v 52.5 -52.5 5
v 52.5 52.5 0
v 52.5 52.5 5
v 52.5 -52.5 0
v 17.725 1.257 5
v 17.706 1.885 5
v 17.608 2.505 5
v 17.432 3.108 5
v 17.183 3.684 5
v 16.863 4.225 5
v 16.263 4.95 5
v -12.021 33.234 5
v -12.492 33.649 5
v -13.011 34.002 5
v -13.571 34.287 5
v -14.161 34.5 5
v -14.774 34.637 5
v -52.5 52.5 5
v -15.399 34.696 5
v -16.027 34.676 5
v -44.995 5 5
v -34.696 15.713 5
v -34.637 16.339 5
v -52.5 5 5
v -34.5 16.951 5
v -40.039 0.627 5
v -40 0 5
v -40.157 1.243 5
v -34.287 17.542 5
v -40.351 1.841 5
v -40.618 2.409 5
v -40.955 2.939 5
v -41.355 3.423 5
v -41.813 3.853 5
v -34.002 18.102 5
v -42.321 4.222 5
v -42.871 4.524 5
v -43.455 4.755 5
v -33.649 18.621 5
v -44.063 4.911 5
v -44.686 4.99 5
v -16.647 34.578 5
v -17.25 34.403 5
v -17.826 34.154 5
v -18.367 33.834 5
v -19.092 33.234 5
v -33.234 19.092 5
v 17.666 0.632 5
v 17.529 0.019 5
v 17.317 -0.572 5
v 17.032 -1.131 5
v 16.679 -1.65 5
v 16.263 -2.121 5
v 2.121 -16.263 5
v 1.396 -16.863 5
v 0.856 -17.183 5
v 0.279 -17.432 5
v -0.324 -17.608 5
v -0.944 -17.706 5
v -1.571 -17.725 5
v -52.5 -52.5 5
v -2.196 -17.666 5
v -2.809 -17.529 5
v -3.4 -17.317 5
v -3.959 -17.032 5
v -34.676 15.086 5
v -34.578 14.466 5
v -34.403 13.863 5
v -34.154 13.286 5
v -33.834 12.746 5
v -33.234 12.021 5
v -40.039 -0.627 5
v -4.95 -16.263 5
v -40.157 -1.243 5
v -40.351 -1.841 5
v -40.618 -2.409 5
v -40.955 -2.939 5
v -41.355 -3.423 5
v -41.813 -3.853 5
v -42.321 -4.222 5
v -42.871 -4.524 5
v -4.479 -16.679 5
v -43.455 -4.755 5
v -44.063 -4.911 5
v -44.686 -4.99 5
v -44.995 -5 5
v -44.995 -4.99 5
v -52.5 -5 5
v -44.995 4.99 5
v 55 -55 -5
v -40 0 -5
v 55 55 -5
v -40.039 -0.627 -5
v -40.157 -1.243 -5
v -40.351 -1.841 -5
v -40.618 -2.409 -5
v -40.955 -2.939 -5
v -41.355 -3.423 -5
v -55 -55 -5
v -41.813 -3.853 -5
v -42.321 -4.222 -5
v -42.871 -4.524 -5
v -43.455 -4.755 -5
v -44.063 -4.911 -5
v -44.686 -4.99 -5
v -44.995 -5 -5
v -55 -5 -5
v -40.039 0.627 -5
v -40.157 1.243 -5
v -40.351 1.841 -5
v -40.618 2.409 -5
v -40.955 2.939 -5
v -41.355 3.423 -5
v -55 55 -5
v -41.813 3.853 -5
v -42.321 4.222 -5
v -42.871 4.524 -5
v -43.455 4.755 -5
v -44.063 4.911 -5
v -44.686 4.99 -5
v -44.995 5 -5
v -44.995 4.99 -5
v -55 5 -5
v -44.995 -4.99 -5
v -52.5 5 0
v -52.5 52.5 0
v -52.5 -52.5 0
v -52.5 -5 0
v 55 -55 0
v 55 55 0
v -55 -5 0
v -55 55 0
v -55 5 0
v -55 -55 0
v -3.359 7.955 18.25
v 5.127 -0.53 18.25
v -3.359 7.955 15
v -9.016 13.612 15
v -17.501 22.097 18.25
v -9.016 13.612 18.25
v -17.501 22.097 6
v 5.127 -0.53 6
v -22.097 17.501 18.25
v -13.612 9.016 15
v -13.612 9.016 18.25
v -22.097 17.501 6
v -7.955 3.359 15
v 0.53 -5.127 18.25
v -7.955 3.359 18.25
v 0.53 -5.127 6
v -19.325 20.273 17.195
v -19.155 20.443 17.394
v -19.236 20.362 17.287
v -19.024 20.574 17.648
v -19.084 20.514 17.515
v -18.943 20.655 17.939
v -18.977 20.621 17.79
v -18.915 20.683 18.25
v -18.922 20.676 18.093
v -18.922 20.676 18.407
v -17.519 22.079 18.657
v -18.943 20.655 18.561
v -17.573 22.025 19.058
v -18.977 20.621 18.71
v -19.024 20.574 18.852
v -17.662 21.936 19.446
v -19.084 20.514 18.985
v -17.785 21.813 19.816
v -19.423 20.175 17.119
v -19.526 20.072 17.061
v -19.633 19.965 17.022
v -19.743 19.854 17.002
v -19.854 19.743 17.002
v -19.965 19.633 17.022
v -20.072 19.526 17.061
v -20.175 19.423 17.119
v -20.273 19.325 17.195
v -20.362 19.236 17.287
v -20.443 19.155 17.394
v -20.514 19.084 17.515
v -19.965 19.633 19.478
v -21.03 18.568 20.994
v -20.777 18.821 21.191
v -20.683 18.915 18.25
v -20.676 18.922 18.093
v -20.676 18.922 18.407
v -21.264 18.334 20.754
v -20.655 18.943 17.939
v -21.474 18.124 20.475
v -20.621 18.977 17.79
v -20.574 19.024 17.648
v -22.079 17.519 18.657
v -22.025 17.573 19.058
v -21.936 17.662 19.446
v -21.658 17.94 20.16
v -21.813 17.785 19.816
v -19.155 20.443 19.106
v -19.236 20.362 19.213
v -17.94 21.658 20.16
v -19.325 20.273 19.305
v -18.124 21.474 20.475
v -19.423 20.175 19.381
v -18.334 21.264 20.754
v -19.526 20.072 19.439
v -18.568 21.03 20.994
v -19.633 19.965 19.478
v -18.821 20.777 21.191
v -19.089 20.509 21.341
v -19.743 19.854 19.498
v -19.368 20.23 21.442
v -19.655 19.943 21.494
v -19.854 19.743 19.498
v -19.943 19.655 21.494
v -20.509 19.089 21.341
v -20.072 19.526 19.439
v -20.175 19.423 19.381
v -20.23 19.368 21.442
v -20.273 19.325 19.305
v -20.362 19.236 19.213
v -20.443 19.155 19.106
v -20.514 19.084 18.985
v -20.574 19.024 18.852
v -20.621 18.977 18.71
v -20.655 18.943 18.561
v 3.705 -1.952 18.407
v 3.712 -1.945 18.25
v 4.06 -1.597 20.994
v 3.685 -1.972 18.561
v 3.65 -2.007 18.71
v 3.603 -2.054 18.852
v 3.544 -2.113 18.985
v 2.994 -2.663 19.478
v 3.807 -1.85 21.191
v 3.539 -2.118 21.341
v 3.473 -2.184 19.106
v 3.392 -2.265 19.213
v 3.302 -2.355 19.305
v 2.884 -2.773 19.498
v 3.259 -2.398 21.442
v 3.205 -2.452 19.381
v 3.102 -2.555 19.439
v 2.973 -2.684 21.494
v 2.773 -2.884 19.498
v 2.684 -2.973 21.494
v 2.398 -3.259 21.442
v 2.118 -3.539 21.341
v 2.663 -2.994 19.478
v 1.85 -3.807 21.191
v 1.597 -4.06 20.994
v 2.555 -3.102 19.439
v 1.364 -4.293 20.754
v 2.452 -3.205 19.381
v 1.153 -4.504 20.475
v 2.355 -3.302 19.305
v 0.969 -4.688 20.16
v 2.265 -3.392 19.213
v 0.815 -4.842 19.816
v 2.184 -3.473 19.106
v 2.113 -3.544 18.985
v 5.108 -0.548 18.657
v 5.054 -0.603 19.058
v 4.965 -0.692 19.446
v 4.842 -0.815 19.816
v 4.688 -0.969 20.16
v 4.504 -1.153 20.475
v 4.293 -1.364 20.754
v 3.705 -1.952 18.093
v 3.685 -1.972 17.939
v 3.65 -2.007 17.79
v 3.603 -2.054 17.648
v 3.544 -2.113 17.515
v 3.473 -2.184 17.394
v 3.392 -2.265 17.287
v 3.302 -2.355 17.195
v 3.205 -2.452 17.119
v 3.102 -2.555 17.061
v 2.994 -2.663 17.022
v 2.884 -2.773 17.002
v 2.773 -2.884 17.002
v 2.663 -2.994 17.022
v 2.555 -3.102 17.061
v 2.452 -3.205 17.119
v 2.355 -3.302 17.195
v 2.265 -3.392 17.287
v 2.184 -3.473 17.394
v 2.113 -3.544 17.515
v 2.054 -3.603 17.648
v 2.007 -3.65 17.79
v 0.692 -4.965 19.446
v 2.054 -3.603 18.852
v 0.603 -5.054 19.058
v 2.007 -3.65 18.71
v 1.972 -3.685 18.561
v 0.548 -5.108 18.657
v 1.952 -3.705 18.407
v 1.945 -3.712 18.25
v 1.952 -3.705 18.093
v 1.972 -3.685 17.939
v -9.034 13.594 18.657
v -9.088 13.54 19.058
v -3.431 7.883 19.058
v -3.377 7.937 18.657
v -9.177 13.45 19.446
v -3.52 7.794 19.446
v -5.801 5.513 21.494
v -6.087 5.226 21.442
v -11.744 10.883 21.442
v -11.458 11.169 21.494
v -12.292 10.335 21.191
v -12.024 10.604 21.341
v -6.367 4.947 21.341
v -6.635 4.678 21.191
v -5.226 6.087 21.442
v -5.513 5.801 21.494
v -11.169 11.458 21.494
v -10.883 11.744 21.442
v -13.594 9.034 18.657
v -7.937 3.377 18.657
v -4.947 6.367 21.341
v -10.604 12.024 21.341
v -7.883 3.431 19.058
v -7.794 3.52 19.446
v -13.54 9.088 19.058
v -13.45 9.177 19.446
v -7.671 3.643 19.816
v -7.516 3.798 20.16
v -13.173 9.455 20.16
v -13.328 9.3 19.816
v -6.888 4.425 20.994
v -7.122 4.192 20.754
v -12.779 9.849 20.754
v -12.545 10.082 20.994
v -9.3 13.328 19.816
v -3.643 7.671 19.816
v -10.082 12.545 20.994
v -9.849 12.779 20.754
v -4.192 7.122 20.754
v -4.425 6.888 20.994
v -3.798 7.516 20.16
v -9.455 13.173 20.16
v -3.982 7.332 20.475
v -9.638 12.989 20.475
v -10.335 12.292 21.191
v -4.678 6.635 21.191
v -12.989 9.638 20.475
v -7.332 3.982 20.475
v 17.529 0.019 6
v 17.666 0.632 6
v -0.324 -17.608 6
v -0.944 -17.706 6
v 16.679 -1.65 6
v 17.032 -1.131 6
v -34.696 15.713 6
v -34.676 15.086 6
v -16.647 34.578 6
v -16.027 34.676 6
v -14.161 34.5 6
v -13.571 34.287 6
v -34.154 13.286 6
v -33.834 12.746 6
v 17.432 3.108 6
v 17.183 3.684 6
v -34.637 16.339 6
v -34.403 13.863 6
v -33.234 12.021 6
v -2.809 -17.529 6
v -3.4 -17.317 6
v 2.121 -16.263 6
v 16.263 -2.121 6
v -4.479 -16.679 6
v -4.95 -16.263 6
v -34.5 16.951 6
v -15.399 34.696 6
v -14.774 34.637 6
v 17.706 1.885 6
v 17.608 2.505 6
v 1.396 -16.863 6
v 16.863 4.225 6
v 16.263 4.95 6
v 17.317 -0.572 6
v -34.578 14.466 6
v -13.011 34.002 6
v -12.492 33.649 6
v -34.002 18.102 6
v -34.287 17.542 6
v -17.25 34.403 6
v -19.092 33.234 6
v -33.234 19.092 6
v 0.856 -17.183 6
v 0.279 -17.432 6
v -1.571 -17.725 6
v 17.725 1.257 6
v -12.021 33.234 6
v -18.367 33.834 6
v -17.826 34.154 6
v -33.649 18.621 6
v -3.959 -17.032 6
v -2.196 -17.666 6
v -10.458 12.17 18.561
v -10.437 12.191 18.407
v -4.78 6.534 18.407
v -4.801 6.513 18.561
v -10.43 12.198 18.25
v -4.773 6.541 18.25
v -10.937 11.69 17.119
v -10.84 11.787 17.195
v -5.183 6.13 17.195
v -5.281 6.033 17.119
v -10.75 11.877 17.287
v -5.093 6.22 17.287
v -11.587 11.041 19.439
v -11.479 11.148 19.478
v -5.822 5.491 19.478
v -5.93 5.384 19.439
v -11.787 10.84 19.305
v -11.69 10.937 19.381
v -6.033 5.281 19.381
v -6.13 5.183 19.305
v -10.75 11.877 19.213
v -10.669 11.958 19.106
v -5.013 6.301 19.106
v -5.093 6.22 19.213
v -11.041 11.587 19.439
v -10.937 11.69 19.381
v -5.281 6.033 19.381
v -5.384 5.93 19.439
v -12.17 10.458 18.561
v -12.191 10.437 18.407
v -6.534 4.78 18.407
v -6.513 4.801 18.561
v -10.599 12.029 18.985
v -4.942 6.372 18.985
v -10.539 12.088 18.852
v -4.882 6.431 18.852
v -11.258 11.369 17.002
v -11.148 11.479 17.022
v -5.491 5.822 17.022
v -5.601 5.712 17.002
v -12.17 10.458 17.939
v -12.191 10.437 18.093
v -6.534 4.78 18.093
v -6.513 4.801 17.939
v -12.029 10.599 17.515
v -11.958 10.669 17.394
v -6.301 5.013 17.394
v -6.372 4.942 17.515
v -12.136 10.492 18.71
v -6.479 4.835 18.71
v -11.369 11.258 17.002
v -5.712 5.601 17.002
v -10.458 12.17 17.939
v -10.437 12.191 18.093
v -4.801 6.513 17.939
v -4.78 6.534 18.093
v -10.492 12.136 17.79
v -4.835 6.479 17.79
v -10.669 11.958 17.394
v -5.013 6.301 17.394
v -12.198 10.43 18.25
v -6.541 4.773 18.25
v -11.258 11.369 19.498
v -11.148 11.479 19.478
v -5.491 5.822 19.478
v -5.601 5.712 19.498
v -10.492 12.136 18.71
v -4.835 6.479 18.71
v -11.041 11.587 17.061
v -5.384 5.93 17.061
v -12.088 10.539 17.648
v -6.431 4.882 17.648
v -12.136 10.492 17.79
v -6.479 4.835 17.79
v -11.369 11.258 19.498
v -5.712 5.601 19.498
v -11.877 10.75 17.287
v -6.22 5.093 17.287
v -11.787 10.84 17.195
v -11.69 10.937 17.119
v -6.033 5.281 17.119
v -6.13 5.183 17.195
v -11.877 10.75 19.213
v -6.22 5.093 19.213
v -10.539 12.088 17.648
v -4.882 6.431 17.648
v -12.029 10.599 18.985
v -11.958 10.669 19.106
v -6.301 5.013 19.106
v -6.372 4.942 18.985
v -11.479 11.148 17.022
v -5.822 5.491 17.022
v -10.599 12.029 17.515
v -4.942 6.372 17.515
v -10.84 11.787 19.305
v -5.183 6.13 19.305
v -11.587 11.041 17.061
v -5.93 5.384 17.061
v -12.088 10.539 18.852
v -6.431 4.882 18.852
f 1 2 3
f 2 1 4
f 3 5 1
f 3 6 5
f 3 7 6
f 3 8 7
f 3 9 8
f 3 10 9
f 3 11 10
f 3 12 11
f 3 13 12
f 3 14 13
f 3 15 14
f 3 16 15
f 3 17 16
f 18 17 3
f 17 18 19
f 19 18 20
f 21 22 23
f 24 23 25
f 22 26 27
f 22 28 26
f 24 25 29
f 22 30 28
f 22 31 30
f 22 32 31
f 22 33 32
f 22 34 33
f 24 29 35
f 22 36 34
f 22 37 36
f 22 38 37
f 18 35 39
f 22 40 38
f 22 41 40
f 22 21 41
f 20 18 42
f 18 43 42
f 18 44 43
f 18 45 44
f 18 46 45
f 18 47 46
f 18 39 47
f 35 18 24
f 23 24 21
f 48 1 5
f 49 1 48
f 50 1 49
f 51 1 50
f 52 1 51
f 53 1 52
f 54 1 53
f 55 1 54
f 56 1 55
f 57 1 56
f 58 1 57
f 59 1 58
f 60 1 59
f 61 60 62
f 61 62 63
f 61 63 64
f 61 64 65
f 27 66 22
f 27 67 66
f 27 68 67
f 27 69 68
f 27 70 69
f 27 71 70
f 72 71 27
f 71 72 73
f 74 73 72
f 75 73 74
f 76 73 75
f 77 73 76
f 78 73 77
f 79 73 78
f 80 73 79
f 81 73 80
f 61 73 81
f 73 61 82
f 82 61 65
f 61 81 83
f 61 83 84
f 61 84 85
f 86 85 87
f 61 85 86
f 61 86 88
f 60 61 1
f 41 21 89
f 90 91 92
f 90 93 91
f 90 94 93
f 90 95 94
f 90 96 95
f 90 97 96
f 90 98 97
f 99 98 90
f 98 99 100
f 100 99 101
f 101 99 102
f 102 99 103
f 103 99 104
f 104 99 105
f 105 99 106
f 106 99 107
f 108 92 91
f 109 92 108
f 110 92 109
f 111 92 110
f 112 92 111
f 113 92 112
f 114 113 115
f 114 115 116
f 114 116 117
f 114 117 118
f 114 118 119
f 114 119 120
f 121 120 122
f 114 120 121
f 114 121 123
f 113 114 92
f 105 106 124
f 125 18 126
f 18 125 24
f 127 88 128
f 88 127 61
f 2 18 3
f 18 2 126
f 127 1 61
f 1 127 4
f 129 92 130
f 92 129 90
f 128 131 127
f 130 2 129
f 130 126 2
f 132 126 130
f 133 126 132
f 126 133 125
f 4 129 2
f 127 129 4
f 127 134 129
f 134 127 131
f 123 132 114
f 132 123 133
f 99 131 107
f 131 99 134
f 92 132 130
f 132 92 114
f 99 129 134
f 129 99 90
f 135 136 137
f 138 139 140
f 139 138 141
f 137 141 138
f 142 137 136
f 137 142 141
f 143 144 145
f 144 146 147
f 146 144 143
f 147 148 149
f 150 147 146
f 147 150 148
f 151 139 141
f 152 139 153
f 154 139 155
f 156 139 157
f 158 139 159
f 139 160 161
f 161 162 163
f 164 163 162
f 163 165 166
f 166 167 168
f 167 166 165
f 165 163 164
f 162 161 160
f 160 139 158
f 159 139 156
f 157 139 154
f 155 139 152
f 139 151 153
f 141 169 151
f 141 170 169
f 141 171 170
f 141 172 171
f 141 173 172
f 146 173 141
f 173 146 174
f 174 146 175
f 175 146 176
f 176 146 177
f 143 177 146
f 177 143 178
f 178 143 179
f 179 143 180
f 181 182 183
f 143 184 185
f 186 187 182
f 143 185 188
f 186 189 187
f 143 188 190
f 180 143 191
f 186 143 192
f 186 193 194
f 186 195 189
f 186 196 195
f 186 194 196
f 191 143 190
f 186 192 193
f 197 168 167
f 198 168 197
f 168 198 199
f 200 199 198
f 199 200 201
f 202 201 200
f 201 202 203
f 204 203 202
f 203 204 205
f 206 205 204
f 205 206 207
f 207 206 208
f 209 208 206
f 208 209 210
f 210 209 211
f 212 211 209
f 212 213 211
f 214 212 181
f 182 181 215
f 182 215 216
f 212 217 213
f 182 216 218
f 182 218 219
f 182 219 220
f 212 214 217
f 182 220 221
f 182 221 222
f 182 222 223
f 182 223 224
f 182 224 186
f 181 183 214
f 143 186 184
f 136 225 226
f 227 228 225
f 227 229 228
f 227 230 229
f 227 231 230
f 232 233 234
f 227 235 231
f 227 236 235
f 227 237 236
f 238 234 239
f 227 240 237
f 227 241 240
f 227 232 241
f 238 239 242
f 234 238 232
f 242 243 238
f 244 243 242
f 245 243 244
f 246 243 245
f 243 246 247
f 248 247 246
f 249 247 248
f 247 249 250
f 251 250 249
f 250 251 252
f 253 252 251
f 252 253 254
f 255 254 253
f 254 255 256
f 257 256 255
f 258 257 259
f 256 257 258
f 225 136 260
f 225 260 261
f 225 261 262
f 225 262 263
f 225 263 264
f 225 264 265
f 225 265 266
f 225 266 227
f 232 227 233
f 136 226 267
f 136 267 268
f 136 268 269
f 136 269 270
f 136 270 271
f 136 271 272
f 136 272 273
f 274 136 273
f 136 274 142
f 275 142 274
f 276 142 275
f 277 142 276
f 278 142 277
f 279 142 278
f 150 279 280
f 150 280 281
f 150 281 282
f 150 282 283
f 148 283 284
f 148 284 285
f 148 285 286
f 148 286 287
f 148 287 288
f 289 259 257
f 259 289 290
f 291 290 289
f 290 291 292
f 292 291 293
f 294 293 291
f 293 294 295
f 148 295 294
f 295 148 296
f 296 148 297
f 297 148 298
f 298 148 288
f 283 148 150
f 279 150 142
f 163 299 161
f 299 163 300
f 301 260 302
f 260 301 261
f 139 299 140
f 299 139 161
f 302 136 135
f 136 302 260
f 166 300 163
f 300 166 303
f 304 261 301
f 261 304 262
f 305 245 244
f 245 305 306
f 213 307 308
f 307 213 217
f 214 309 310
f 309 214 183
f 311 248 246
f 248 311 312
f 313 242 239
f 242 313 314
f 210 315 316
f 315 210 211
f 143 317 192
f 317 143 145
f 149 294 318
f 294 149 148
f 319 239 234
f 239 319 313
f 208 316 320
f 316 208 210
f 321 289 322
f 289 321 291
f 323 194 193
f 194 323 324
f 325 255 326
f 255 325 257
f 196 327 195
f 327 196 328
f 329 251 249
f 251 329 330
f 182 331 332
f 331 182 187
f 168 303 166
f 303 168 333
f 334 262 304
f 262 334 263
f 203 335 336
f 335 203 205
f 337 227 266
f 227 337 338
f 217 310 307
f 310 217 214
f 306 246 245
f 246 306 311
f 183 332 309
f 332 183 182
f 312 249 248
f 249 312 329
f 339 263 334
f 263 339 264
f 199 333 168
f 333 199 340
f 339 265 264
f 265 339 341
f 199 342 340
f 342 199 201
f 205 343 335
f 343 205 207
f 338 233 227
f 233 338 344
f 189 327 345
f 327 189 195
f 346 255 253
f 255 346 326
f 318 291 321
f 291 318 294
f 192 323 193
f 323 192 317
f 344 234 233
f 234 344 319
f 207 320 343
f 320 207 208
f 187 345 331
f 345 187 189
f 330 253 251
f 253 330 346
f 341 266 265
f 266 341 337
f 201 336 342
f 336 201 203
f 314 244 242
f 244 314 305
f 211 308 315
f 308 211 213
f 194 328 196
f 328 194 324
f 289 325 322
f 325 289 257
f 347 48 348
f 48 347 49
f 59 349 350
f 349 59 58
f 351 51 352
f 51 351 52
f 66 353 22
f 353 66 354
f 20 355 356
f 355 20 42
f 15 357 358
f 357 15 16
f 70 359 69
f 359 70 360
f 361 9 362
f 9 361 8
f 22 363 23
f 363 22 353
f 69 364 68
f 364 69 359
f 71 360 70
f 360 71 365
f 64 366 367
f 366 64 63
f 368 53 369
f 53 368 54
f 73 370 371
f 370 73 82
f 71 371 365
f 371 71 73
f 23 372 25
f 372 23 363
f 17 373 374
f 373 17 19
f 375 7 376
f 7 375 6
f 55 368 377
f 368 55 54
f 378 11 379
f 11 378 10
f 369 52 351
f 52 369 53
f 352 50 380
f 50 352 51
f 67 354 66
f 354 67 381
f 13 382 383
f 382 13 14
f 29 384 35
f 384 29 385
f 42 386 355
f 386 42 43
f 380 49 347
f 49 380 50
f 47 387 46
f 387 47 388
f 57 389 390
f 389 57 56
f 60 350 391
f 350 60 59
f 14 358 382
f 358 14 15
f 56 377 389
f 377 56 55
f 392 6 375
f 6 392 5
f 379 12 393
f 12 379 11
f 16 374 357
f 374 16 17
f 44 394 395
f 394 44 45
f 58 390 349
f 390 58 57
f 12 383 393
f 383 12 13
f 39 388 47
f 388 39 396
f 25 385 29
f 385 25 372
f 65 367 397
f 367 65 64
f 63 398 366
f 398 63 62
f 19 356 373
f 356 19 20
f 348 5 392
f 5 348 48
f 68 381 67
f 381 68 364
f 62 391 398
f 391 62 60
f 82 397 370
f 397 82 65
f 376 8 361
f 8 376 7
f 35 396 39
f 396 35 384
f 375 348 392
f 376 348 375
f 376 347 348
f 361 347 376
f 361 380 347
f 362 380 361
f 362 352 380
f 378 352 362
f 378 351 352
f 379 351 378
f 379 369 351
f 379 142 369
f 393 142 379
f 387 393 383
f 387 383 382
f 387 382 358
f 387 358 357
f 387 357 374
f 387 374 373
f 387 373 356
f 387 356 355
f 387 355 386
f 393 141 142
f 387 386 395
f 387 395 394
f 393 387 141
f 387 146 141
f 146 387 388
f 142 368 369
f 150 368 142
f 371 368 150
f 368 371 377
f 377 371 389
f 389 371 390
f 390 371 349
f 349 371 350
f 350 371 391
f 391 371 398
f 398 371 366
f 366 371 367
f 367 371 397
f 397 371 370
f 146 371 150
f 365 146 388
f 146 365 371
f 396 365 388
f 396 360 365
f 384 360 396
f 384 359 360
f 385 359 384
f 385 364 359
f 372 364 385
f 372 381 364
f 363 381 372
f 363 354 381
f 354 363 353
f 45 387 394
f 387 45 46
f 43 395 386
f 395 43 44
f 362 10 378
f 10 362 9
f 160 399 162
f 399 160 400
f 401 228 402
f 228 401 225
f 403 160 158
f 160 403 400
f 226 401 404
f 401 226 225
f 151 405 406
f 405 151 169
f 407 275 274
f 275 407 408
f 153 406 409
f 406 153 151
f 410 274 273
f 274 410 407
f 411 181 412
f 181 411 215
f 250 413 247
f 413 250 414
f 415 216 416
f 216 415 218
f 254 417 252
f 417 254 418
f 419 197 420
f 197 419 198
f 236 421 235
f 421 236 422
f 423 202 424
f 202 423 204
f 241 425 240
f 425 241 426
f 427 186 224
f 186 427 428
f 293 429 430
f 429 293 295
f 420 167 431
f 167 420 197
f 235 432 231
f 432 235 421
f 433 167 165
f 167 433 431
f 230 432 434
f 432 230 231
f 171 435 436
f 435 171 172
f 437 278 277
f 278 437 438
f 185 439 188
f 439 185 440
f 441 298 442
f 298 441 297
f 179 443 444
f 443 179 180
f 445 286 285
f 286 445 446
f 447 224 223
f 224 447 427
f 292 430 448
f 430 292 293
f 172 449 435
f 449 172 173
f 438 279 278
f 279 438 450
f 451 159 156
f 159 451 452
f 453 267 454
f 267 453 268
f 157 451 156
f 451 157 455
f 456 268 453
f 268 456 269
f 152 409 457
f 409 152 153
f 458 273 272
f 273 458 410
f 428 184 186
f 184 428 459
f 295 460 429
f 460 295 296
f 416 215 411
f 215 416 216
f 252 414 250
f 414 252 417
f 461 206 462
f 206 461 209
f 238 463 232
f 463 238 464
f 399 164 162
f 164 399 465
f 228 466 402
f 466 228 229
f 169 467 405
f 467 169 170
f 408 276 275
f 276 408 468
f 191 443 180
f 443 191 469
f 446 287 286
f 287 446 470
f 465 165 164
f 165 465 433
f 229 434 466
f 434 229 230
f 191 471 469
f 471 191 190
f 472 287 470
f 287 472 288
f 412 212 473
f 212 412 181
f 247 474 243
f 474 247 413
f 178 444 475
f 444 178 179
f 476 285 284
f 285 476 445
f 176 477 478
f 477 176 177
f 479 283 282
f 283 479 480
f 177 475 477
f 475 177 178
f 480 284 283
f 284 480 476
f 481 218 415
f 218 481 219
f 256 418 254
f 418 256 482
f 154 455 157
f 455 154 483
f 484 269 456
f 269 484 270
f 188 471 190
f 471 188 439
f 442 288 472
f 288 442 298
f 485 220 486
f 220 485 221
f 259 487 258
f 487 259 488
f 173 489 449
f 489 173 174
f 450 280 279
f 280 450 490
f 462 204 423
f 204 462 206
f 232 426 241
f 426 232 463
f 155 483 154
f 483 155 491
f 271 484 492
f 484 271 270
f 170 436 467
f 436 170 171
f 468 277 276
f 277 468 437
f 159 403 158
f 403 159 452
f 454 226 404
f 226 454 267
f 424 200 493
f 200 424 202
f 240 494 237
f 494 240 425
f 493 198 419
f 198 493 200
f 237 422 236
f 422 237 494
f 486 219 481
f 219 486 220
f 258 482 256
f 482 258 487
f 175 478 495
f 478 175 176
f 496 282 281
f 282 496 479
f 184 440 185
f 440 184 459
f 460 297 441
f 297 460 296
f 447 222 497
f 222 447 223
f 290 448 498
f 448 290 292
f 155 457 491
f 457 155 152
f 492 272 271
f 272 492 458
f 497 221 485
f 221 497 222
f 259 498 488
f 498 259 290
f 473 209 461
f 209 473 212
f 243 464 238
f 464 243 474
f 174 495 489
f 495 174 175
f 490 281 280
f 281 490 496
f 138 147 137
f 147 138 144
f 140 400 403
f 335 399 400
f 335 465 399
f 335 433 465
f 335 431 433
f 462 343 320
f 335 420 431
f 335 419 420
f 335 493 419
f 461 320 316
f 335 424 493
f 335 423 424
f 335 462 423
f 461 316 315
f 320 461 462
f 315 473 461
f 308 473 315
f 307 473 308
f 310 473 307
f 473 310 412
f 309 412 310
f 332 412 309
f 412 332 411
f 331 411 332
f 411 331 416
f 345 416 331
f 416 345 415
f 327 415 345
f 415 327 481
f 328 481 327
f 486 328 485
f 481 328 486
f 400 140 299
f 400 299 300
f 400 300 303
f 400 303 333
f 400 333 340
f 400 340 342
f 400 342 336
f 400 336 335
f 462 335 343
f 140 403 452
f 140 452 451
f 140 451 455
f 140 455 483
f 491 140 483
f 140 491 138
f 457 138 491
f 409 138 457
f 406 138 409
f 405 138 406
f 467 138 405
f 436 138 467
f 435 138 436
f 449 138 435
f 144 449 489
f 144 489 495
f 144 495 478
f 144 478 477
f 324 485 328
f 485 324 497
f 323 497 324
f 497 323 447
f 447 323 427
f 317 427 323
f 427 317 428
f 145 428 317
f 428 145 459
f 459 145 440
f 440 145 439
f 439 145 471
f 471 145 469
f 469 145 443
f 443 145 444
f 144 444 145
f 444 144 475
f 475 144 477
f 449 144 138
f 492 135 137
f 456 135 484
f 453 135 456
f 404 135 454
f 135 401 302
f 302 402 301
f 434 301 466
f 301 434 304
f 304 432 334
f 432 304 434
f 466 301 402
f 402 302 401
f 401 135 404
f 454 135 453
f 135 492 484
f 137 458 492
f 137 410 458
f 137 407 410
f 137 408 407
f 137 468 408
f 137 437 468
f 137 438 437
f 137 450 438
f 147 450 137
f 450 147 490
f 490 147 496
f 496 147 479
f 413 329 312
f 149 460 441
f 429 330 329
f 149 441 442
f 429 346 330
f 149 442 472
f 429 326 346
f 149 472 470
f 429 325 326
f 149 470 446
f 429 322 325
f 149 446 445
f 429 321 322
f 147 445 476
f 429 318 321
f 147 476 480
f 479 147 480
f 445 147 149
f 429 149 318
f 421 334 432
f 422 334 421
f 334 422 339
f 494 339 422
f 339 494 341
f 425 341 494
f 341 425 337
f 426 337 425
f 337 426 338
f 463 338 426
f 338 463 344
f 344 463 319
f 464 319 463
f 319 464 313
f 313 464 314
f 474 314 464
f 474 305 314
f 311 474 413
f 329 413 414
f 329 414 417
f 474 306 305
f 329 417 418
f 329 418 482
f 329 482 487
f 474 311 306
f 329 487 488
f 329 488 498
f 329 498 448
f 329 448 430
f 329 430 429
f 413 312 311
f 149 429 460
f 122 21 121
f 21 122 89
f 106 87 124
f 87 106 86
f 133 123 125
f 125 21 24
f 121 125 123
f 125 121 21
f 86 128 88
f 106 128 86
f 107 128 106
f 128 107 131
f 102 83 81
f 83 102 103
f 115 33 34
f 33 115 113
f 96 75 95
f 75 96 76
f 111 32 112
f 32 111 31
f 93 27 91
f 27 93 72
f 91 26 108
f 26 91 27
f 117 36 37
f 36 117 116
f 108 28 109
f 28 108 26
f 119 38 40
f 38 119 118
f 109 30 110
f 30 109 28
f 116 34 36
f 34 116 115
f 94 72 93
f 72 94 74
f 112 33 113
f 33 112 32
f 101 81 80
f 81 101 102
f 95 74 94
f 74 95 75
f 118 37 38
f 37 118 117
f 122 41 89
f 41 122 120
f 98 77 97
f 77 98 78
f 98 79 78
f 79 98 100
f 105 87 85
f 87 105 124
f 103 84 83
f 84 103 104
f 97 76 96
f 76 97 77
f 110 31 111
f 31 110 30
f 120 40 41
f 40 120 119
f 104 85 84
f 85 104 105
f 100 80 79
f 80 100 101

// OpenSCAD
$fn = 50;

cap_width = 100;
cap_height = 10;
D_mount = 6.5;       // Диаметр монтировки
D_inner_mount = 2.5; // Диаметр отверстия под стержень (D_mount - 2*thickness)
width_mount = 32;    // Ширина монтировки
dist_mount = 8;      // Ширина пропила под шип камеры
shift_mount = 12;    // Смещение объектива относительно центра камеры
shift_distance = 10; // Смещение объектива вверх относительно плоскости

wall_thickness = 5;  // Толщина стенки

slot_height = 5;            // Ширина паза
slot_width = slot_height/2; // Толщина паза

D_hole = 10; // Диаметр отверстия для проводов

EPS = 0.01; 

notch_depth = 0.5;
notch_width = 2;
notch_height = 2;
notch_offset = 2;

// ============================================================
// МОДУЛЬ КРЕПЛЕНИЯ КАМЕРЫ (ОБНОВЛЁННАЯ ВЕРСИЯ)
// ============================================================
module cam_mount(width, D, D_inner, space) {
     difference() {
        union() {
            translate([0, 0, D/4+shift_distance/2]) 
                cube([D, width, D/2+shift_distance], center = true); // Прямоугольная подпорка
            
            translate([0, 0, D/2+shift_distance]) rotate([90,0,0]) 
                cylinder(h = width, d = D, center = true); // Цилиндрическая подпорка
            
            // 🔥 ОБНОВЛЕНИЕ: скруглённое основание крепления камеры
            linear_extrude(height = 2, center = true)
                offset(r = 5)
                square([30 - 2*5, 50 - 2*5], center = true);
        };
        
        translate([0, 0, D/2+shift_distance]) rotate([90,0,00]) 
            cylinder(h = width + 1, d = D_inner, center = true); // Отверстие для винта
        
        translate([0, 0, D/2+shift_distance]) 
            cube([D+EPS, space, D+0.], center = true); // Центральный вырез
     };
    
    // Упор
    translate([0, width_mount/2 - notch_offset, D_mount/2 - notch_height])
        cube([notch_width, notch_depth, notch_height/2], center = true);
}

// ============================================================
// МОДУЛЬ КРЫШКИ
// ============================================================
module cap() {
    width = cap_width + 2*slot_width;
    out_width = cap_width + 2*wall_thickness;
    out_height = cap_height - slot_height;

    cube([width, width, cap_height], center = true);  // крышка 110×110×10
    translate([0, 0, -cap_height/2 + slot_height/2]) 
        cube([out_width, out_width, out_height], center = true);
}

// ============================================================
// МОДУЛЬ ОТВЕРСТИЯ ДЛЯ ПРОВОДОВ
// ============================================================
module hole(length, width) {
    h = 100;
    cube_length = length - width;
    cube([cube_length + EPS, width, h], center = true);
    translate([cube_length/2, 0, 0]) 
        cylinder(h = h, d = width, center = true);
}

// ============================================================
// СБОРКА: крышка + крепление камеры - отверстие для проводов
// ============================================================
difference() {
    union() {
        cap();   // Крышка
        rotate([0, 0, 45]) translate([0, shift_mount, cap_height/2])  
            cam_mount(width_mount, D_mount, D_inner_mount, dist_mount); // Крепление для камеры
    }
    // Вырез для провода
    translate([-cap_width/2, 0, 0]) hole(2*D_hole, D_hole);
}
